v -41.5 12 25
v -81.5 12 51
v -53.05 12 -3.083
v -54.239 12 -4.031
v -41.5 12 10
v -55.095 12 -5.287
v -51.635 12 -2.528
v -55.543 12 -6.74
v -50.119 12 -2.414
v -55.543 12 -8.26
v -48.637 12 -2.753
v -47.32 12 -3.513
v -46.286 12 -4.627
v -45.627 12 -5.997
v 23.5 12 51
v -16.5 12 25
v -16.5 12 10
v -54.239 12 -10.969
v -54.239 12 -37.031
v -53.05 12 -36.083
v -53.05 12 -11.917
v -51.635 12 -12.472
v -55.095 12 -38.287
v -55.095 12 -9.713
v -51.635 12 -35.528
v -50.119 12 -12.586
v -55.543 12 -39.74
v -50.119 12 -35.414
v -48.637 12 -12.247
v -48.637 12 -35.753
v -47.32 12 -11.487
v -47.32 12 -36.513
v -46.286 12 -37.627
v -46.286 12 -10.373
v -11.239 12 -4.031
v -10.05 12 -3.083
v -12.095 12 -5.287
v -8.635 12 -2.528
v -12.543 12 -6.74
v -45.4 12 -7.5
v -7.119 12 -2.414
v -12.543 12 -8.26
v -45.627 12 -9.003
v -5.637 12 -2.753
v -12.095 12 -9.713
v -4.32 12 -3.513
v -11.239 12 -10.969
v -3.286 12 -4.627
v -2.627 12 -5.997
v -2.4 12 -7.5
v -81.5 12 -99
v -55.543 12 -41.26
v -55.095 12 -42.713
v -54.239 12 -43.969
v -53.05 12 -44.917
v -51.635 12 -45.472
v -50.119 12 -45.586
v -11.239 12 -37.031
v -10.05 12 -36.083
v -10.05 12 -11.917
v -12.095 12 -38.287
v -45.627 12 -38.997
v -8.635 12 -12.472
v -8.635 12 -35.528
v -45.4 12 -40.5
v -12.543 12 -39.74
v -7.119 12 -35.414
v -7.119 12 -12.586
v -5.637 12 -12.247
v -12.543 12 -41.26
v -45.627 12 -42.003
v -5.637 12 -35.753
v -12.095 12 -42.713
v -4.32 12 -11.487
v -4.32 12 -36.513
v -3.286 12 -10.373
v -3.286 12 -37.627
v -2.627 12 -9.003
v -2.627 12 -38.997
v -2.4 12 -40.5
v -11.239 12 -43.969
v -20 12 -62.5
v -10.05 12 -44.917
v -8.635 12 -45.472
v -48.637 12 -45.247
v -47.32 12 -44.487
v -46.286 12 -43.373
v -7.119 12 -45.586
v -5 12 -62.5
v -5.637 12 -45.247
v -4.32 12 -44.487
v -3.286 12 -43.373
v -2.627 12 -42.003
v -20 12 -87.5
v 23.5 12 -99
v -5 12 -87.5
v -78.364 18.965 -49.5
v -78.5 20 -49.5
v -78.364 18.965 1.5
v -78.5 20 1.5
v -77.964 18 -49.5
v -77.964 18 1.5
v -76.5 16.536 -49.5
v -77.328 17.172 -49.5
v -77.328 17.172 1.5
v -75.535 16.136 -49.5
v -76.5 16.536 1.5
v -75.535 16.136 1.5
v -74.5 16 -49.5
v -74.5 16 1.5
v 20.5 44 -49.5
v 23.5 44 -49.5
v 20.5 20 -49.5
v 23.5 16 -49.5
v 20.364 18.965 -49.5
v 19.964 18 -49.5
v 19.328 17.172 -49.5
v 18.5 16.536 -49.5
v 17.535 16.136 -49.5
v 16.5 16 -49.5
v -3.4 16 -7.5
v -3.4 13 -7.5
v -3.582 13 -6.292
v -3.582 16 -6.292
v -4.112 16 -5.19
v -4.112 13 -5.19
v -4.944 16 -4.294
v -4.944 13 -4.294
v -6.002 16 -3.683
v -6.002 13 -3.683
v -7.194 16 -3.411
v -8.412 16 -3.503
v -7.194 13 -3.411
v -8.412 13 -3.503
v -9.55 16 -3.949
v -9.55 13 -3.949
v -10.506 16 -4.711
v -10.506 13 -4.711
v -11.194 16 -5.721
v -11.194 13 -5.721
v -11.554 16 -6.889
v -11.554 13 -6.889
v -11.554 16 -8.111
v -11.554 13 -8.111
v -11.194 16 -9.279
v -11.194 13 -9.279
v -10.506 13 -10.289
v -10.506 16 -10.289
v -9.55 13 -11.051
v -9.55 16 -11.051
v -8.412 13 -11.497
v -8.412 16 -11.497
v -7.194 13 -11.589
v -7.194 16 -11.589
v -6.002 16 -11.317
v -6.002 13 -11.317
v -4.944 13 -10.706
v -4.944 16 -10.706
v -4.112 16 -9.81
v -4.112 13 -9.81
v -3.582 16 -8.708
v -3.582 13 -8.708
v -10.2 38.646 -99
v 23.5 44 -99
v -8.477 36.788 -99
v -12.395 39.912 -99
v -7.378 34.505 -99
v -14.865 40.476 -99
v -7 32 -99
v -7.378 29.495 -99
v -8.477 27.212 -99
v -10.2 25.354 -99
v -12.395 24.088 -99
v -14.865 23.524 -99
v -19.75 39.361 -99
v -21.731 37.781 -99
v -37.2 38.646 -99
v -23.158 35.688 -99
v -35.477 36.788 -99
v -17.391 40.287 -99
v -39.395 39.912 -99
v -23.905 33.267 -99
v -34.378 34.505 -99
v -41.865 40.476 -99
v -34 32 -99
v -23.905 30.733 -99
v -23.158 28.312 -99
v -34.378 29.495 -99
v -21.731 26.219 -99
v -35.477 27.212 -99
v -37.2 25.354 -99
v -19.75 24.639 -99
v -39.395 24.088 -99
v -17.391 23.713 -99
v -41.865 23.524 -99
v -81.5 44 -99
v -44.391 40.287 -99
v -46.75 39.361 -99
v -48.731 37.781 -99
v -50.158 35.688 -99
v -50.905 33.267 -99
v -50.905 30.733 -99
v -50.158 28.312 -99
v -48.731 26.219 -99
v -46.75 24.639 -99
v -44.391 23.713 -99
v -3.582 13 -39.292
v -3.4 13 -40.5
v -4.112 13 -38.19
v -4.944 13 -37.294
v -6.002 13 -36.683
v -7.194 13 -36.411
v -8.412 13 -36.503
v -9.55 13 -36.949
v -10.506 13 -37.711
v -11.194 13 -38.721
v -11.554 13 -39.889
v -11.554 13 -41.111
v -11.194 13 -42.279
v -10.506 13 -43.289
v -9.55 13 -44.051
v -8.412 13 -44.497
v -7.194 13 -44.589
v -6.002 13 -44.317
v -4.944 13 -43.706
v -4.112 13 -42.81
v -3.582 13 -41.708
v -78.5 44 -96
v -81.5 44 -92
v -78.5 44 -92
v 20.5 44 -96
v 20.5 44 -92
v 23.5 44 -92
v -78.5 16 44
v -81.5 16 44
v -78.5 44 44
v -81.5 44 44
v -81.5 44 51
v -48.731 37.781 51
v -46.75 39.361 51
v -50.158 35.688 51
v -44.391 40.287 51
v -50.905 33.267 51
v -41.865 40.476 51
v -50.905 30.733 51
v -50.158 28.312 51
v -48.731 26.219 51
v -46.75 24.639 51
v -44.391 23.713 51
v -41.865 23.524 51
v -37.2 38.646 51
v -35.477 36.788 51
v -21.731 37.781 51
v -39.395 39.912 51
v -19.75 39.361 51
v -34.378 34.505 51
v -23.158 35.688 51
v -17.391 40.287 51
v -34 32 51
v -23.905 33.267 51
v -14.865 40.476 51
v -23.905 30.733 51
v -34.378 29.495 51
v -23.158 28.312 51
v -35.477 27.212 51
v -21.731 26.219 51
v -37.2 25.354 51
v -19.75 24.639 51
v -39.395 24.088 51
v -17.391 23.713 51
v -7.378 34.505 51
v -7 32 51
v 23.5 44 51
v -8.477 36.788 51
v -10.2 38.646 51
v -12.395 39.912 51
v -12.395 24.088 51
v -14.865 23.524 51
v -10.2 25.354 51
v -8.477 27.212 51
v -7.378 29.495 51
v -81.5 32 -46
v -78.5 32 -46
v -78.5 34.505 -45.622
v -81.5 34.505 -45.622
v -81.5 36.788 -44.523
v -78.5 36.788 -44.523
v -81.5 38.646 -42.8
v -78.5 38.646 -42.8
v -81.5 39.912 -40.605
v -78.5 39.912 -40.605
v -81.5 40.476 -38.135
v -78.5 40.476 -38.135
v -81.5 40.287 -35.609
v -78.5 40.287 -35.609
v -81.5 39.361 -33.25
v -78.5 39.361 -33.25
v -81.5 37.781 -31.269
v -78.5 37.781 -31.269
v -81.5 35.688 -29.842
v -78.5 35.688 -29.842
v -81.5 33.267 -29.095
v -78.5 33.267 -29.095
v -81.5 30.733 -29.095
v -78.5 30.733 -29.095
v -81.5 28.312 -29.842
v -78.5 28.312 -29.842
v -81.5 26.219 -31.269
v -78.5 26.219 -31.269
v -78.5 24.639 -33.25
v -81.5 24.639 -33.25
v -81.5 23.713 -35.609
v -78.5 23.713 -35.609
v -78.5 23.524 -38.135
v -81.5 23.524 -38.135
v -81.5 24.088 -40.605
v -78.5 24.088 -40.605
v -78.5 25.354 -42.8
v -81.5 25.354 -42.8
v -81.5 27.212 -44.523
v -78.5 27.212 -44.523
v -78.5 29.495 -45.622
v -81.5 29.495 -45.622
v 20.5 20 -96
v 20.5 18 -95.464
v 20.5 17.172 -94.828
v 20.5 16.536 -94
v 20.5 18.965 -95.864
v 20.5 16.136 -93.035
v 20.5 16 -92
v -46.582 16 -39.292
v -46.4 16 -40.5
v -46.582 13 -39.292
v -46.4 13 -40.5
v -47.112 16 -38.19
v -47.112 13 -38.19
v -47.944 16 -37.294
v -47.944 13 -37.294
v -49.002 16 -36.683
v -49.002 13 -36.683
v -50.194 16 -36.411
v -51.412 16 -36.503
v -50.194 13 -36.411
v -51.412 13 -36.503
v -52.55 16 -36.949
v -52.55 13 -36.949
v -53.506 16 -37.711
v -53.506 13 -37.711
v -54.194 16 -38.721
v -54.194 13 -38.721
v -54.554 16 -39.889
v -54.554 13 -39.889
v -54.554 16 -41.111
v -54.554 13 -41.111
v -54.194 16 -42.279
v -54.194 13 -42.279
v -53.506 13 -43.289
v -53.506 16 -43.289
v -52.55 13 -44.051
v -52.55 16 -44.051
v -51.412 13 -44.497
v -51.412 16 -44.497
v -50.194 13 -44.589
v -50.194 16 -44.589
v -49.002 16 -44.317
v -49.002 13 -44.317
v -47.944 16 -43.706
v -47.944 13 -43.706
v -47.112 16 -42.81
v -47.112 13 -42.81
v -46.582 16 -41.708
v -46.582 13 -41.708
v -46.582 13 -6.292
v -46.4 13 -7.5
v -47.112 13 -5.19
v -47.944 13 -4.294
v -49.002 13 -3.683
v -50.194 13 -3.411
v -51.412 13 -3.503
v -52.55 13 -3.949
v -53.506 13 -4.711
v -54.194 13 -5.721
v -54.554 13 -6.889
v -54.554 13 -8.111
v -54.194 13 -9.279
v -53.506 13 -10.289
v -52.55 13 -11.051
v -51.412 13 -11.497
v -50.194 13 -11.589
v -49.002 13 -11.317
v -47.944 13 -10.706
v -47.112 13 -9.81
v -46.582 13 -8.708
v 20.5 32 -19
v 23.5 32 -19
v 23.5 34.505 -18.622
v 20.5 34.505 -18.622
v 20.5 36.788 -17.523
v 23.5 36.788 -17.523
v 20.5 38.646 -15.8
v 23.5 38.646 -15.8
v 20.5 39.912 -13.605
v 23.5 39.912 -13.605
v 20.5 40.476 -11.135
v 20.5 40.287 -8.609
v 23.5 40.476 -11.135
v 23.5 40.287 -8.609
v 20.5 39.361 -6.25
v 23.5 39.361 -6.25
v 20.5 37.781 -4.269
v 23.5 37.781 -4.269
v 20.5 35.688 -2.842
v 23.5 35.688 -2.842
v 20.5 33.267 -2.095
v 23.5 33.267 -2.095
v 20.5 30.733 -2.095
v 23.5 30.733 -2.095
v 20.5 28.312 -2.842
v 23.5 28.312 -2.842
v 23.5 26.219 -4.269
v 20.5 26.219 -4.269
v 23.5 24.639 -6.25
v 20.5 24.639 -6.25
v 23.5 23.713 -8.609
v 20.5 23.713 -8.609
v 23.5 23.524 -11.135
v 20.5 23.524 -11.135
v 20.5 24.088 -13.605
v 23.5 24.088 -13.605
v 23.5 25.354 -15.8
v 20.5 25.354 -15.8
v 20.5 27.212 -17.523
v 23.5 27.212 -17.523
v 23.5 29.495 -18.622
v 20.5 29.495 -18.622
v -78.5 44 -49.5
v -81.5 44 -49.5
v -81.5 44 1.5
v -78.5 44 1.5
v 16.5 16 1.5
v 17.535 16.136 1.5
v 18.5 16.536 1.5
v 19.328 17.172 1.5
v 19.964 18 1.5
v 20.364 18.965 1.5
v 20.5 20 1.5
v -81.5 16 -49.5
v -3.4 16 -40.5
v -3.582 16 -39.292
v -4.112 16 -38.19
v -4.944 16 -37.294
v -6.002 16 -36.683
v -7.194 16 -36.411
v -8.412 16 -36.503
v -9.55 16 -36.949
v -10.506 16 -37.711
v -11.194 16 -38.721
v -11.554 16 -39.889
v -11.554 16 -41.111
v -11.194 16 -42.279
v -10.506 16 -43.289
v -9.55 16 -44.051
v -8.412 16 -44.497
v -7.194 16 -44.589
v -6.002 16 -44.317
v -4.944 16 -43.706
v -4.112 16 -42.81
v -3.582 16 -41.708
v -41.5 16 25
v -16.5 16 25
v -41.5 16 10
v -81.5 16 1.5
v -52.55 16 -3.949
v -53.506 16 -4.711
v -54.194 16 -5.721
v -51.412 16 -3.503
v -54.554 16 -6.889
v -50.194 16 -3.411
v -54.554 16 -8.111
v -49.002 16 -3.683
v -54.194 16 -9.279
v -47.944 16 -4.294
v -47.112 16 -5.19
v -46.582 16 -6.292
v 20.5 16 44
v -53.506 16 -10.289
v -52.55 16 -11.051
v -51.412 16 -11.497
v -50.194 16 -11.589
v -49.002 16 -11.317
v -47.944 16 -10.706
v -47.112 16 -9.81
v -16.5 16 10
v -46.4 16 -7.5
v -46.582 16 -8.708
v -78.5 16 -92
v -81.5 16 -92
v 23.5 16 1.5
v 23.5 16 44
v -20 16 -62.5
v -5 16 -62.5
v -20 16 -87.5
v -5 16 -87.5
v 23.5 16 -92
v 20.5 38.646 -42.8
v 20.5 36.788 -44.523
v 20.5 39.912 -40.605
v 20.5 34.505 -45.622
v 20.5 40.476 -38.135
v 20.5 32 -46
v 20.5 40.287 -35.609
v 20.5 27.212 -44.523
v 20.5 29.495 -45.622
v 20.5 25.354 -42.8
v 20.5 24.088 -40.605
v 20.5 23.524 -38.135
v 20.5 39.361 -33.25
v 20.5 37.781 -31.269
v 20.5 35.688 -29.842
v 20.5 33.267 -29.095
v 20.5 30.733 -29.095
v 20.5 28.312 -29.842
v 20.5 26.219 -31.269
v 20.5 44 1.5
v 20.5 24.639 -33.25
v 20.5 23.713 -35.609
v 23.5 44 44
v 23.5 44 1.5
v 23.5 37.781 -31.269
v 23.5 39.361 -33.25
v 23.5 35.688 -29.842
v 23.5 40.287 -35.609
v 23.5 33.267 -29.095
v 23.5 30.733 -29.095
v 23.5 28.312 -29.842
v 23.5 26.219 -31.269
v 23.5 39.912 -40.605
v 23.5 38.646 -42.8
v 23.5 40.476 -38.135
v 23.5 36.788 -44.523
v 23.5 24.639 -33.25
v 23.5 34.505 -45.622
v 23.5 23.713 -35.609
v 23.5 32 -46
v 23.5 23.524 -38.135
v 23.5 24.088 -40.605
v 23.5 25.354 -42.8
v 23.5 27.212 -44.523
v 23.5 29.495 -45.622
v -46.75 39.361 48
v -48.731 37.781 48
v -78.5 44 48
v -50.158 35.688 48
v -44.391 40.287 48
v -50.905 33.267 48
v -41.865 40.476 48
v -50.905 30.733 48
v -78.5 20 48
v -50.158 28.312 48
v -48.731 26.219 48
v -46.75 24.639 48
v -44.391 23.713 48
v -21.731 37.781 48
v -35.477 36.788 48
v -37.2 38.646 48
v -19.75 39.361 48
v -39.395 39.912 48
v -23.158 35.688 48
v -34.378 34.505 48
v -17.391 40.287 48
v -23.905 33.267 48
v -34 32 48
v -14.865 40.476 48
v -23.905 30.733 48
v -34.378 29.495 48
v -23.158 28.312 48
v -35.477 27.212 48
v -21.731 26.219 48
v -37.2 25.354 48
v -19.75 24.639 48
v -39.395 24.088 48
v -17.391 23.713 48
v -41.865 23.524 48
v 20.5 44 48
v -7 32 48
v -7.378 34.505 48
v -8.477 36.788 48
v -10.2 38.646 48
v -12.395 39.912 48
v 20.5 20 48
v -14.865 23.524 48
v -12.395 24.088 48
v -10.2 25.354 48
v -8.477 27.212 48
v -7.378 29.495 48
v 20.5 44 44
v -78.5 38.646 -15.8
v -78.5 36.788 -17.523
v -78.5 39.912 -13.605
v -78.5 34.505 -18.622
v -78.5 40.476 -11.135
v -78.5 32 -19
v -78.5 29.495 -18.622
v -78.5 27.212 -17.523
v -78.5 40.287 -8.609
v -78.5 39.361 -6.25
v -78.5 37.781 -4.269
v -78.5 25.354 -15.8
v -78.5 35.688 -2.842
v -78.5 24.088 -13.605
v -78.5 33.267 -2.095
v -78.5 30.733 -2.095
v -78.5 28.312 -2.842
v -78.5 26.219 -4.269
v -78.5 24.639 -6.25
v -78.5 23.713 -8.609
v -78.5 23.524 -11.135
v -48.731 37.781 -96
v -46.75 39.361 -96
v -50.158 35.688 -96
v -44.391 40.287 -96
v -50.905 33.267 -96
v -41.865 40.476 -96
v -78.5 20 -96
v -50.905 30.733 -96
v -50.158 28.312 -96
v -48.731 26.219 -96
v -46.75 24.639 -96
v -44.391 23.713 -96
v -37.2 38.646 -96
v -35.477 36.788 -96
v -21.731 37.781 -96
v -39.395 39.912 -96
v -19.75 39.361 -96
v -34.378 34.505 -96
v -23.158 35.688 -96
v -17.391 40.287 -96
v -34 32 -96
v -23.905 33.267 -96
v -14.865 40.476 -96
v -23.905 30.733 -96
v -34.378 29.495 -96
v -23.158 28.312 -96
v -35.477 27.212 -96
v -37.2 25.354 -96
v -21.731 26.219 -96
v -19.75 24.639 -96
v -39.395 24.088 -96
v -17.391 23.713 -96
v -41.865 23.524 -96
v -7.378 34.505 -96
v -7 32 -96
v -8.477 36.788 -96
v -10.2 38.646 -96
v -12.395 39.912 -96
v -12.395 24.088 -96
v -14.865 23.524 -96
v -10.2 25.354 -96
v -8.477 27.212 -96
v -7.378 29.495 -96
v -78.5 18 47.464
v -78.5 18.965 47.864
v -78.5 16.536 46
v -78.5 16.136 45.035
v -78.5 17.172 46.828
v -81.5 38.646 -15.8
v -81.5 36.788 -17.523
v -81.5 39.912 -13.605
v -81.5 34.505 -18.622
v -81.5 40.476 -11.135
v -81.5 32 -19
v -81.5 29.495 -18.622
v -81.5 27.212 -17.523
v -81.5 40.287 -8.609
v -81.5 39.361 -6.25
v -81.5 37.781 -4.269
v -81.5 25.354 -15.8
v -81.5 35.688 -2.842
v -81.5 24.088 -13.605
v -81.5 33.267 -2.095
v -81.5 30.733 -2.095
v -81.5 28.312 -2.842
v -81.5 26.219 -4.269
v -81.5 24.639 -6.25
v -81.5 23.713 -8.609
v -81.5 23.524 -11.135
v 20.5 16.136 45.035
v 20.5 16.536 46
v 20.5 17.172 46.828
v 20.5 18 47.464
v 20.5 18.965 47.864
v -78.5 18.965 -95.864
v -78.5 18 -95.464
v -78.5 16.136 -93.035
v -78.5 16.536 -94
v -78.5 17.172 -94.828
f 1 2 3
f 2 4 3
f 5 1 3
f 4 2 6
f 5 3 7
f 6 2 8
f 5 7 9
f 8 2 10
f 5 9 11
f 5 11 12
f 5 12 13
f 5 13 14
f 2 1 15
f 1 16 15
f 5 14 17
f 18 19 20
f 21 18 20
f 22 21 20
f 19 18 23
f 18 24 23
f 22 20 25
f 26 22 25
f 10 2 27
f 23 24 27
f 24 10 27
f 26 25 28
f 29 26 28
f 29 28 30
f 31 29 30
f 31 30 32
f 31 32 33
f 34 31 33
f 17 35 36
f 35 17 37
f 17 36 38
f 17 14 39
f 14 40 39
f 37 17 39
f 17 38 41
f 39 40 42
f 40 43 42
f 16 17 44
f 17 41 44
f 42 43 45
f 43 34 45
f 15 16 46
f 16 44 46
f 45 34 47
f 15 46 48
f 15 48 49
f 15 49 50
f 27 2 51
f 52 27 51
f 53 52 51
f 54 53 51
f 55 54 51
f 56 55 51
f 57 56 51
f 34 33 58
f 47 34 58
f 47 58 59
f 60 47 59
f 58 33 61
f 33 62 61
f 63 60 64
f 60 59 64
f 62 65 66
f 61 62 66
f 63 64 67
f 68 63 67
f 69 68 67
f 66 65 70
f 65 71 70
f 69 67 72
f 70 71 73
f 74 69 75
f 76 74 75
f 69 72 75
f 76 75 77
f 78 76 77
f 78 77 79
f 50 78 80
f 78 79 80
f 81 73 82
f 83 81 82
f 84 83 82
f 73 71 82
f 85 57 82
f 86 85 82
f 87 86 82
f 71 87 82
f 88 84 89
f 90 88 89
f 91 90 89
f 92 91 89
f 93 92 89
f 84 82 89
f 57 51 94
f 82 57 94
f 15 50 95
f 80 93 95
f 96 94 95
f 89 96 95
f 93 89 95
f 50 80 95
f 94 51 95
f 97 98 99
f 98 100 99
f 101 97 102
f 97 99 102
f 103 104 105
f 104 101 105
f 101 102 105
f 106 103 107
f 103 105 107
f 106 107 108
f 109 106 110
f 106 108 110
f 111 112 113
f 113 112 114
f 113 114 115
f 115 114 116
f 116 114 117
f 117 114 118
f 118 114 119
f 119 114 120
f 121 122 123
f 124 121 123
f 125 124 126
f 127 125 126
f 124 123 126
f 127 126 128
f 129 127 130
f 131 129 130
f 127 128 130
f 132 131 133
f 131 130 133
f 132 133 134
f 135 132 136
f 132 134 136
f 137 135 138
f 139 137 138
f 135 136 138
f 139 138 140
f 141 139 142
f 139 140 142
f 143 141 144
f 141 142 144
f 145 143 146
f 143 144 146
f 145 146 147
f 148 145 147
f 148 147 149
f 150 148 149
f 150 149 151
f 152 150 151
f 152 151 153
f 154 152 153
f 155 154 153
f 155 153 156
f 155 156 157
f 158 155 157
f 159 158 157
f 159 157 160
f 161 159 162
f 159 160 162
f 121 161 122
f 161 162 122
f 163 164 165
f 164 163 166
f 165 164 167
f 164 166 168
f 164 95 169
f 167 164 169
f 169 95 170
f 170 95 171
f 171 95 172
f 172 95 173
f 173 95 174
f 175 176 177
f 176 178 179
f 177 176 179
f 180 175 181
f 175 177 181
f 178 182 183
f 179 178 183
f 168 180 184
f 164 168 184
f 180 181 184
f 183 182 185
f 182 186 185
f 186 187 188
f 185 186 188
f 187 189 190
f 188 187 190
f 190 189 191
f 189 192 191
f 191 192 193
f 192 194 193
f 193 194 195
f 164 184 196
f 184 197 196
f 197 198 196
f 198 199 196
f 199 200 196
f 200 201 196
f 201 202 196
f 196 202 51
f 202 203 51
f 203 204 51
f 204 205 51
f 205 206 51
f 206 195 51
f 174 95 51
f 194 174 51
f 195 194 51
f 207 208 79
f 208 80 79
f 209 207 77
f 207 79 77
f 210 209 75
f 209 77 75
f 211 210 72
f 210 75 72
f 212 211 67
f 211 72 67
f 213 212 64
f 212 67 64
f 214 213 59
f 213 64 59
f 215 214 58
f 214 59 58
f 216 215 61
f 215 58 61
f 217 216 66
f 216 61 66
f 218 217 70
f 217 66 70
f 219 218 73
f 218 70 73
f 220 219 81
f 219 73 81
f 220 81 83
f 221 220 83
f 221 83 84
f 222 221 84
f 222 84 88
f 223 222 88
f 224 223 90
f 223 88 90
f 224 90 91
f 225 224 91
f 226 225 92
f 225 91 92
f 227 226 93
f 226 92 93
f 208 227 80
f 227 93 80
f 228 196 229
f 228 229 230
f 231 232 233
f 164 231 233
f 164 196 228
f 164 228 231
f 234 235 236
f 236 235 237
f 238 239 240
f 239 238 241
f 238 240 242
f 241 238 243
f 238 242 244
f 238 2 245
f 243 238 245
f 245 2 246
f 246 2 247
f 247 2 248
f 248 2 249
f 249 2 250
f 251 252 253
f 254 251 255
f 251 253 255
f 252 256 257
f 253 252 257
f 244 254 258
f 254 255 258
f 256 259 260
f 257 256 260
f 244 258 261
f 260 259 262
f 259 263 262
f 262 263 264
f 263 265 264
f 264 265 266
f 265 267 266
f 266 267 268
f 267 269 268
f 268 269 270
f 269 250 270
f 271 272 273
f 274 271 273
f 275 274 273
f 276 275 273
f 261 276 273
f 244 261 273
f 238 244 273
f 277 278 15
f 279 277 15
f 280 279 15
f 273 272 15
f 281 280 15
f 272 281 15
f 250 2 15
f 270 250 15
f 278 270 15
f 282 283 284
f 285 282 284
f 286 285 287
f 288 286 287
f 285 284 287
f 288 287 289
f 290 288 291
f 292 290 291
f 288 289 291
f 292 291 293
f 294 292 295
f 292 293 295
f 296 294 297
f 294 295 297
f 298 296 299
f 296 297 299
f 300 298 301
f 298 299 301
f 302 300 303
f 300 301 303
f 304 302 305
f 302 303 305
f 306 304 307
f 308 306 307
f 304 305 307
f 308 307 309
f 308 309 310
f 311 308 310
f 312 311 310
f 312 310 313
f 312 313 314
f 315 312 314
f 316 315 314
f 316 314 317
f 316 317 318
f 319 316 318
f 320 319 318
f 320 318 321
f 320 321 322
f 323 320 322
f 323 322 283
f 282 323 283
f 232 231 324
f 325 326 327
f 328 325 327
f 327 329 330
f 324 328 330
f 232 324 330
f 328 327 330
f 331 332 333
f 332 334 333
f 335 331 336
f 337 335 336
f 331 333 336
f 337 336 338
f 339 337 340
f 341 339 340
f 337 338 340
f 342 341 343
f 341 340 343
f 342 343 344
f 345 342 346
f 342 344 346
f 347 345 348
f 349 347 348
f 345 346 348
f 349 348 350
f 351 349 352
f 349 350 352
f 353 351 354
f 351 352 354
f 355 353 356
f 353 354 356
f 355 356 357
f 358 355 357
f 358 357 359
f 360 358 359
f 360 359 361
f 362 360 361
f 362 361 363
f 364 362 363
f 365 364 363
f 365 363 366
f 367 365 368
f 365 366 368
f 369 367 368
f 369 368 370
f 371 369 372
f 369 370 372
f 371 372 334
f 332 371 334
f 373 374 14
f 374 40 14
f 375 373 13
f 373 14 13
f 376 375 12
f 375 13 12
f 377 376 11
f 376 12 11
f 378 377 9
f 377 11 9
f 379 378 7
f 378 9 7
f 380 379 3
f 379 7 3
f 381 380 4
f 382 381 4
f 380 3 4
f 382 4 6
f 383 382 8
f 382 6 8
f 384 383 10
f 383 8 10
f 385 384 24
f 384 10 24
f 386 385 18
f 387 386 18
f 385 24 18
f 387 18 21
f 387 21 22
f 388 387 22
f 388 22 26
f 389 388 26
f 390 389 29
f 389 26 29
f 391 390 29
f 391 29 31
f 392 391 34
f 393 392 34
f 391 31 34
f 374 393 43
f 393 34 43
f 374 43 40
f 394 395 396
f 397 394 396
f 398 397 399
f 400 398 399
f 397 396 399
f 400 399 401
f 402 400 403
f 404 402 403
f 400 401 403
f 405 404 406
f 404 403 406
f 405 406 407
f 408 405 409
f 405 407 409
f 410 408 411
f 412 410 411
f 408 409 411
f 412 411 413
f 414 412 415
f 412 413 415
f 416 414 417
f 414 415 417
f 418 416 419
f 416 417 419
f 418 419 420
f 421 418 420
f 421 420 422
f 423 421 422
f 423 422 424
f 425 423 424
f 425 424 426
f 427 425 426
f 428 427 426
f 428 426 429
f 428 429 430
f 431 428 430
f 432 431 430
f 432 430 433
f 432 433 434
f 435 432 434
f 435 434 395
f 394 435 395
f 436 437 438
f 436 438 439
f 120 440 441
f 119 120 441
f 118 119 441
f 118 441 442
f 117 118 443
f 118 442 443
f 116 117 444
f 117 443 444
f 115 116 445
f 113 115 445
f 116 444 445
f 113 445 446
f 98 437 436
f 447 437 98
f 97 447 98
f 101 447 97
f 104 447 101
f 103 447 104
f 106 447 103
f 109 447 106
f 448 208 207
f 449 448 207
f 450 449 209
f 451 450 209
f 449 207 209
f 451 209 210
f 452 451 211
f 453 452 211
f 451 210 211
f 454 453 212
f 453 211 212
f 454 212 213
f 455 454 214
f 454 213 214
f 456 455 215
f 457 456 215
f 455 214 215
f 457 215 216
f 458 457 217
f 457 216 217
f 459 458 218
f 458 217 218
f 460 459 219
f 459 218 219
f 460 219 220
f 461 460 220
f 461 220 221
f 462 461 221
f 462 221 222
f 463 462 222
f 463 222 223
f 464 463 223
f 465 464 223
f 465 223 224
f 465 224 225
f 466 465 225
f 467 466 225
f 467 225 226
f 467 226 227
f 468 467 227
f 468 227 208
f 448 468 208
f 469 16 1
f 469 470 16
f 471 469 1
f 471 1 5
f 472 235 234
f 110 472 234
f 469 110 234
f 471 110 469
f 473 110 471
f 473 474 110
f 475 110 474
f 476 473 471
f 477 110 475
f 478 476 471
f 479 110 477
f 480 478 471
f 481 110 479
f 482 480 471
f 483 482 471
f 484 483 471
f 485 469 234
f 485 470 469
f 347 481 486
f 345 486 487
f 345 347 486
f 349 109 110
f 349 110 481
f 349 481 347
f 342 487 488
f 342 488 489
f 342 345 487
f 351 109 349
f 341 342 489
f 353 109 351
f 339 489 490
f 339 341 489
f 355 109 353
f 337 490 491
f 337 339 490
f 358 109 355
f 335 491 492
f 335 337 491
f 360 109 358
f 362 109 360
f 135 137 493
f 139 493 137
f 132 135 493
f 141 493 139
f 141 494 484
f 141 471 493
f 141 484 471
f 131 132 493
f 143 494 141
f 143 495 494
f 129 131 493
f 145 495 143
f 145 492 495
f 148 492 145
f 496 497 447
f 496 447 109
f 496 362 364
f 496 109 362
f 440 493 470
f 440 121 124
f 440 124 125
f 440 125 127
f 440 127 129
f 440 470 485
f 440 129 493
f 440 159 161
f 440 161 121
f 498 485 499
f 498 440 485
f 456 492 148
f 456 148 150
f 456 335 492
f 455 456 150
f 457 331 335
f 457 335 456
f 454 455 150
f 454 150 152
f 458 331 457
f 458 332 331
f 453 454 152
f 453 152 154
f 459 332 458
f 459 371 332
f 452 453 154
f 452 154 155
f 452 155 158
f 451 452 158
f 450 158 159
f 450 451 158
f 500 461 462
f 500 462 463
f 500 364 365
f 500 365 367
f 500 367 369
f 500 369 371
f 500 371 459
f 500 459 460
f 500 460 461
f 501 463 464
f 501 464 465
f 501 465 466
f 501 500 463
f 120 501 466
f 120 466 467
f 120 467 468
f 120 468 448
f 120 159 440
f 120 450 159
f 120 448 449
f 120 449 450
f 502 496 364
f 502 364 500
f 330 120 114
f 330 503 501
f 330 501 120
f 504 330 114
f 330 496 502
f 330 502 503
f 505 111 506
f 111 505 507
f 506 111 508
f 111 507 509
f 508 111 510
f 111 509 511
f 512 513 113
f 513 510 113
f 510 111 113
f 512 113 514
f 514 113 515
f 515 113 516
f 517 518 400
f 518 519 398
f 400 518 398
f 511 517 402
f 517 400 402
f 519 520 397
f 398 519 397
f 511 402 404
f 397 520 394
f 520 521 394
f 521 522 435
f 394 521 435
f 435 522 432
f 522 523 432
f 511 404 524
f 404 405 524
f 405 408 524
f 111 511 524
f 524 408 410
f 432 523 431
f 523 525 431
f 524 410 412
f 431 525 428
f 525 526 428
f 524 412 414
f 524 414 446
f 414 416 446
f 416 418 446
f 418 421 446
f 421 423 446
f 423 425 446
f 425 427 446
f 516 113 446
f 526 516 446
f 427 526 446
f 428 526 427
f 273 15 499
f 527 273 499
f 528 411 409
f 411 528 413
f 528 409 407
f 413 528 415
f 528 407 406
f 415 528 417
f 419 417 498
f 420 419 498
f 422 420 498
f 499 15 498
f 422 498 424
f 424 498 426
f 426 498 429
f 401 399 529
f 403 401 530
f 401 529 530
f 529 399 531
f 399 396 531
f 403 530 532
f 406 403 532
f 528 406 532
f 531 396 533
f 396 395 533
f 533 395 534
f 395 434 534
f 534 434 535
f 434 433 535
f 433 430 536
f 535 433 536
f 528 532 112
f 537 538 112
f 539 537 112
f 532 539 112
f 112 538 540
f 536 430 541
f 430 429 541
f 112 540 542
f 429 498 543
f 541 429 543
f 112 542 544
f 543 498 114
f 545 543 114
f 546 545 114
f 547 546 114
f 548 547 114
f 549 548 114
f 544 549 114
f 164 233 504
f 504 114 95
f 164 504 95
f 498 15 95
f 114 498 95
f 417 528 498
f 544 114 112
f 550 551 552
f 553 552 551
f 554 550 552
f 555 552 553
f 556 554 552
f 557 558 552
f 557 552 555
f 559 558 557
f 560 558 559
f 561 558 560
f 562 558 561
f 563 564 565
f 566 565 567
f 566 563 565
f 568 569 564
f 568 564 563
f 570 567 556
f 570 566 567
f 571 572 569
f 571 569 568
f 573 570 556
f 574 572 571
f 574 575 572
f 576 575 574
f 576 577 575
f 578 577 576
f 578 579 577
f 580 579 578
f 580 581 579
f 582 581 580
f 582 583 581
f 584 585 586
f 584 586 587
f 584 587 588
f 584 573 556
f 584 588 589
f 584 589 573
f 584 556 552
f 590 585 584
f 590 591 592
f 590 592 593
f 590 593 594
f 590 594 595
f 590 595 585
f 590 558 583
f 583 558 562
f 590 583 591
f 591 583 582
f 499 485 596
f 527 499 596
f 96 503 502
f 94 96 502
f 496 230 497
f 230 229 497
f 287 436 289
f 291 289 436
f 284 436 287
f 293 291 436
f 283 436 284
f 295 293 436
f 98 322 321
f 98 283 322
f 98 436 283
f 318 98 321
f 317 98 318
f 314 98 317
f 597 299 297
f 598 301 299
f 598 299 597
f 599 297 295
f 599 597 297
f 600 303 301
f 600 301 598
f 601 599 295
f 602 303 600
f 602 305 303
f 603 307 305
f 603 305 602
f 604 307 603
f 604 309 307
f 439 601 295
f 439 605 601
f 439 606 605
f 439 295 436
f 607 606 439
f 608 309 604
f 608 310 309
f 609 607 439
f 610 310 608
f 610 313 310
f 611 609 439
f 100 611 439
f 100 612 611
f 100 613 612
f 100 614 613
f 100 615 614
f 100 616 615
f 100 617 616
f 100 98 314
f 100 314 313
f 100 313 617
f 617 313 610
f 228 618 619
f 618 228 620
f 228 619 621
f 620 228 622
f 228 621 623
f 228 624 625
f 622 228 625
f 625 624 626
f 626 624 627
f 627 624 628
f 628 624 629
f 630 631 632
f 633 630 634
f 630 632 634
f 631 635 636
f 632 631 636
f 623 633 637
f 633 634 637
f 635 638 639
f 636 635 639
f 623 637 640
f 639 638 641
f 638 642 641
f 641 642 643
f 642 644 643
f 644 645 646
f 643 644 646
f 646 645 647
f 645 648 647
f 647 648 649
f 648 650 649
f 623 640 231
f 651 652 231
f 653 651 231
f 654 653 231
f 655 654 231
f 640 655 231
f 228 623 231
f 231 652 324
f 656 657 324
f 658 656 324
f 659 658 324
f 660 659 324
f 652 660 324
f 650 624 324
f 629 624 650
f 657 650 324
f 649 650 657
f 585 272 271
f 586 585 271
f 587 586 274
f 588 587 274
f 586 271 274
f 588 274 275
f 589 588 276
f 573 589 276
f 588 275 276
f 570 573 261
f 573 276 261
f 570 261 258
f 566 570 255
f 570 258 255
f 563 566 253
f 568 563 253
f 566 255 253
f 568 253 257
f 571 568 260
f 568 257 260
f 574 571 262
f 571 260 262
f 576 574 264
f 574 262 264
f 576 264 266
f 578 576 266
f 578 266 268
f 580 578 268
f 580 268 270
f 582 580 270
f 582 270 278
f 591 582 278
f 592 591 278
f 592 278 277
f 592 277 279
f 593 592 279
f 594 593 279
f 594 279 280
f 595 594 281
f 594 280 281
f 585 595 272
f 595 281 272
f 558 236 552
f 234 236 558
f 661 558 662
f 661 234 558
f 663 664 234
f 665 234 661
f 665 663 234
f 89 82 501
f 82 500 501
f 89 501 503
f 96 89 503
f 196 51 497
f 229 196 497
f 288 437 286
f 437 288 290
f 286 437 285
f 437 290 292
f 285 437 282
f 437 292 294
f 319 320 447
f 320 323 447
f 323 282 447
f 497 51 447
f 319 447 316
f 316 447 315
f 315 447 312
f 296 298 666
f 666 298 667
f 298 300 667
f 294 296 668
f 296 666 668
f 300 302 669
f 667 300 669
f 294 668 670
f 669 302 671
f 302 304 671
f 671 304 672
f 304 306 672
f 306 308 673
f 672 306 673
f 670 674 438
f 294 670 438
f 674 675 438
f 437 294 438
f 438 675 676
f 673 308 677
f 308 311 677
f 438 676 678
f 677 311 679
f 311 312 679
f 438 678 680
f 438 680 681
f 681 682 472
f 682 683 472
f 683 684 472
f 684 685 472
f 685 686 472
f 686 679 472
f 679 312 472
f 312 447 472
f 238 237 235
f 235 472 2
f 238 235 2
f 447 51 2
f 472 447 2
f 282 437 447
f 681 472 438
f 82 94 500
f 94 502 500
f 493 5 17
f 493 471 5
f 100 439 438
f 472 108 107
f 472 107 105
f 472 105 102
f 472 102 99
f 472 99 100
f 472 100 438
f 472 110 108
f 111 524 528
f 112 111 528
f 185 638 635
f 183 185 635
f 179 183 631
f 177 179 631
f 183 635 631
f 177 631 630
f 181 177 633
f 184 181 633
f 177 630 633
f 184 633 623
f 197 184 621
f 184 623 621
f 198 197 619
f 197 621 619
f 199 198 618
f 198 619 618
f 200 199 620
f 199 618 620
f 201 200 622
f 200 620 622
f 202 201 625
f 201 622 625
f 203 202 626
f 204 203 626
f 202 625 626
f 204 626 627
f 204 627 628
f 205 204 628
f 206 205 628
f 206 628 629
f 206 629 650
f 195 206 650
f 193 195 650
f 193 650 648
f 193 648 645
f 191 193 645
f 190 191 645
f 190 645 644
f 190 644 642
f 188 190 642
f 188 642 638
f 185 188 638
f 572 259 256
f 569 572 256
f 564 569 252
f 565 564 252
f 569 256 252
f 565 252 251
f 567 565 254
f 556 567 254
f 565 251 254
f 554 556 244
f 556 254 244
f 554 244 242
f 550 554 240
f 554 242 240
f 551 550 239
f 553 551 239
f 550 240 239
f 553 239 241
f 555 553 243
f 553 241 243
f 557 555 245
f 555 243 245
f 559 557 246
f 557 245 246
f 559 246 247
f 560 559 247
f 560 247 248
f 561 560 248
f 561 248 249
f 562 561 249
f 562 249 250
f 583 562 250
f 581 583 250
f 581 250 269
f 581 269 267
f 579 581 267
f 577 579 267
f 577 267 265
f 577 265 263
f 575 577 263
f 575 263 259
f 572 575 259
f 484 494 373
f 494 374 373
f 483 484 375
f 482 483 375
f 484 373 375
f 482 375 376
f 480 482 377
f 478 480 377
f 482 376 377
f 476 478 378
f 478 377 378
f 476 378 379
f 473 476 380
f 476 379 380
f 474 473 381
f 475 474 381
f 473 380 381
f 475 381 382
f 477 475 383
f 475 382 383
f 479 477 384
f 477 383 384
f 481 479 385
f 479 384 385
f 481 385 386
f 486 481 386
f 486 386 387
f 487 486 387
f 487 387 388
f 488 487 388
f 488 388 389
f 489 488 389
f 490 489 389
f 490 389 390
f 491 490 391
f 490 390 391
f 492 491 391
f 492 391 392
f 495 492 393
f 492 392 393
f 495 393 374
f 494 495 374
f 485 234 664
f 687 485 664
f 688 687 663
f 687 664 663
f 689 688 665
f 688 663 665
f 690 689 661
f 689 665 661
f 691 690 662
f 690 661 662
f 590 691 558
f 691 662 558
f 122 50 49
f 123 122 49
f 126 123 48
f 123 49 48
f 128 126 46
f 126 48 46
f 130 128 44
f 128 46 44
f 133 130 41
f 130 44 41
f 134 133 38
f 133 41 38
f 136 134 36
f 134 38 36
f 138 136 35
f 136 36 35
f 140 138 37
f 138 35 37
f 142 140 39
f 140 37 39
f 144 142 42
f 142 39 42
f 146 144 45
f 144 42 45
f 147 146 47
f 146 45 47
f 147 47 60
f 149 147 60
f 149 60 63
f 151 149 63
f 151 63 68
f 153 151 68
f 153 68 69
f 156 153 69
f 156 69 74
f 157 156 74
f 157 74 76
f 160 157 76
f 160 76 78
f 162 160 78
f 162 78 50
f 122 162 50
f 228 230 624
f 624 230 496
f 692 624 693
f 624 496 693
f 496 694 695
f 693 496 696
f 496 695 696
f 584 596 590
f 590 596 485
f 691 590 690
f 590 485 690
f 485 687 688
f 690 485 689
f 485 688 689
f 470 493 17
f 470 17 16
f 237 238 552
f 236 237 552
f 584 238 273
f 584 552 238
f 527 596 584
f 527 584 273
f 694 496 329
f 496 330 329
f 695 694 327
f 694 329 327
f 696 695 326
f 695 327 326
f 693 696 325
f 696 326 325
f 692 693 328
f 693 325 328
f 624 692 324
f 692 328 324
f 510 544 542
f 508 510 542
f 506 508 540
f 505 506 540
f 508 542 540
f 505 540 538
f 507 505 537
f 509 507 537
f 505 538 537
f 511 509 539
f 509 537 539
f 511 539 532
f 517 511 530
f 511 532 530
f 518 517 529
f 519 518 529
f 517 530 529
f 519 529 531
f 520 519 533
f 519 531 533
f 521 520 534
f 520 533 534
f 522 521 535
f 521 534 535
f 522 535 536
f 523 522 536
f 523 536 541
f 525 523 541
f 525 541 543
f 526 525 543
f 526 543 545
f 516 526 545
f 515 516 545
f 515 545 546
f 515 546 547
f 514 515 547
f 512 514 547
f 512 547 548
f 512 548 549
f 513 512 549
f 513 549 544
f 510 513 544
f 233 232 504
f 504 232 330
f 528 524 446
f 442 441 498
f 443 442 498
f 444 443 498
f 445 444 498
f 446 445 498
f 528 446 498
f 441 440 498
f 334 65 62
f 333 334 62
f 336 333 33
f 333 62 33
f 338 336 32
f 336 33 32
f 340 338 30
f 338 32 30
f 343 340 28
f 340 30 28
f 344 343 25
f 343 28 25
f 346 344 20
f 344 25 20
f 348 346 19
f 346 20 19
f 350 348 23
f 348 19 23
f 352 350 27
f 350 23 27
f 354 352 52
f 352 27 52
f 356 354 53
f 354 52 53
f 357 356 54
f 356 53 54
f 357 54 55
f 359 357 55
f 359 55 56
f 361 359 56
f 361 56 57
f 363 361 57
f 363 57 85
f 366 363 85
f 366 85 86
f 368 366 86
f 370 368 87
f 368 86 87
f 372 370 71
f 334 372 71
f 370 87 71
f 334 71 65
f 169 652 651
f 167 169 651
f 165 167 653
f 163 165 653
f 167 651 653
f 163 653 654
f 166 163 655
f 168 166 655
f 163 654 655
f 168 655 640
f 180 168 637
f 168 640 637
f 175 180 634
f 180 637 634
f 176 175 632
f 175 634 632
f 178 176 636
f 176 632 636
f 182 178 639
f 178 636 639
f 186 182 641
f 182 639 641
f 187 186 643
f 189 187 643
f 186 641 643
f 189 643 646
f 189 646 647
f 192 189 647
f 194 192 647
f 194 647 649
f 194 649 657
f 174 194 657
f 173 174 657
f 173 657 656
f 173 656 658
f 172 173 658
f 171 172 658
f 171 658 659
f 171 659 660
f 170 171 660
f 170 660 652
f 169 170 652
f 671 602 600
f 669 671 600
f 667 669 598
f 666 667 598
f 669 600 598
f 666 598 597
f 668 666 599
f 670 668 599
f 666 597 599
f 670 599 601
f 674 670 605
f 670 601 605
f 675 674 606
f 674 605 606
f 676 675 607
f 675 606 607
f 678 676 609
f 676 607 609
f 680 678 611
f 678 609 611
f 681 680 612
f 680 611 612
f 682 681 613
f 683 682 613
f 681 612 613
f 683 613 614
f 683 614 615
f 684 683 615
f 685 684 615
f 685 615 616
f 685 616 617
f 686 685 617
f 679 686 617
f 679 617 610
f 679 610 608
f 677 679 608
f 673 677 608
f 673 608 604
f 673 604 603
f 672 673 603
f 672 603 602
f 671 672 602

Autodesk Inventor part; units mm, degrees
ref_plane "YZ Plane" through (0, 0, 0) normal (1, 0, 0) x (0, 1, 0)
ref_plane "XZ Plane" through (0, 0, 0) normal (0, 1, 0) x (-1, 0, 0)
ref_plane "XY Plane" through (0, 0, 0) normal (0, 0, 1) x (1, 0, 0)
sketch "Sketch1" plane through (0, 0, 0) normal (0, 1, 0) x (-1, 0, 0)
  line L0 (0, 0) -> (58, 0) construction
  line L1 (58, 0) -> (58, -48) construction
  line L2 (58, -48) -> (0, -48) construction
  line L3 (0, -48) -> (0, 0) construction
  circle A0 centre (50.5, -7.5) radius 2.35
  circle A1 centre (50.5, -40.5) radius 2.35
  circle A2 centre (7.5, -7.5) radius 2.35
  circle A3 centre (7.5, -40.5) radius 2.35
  circle A4 centre (50.5, -7.5) radius 5
  circle A5 centre (50.5, -40.5) radius 5
  circle A6 centre (7.5, -7.5) radius 5
  circle A7 centre (7.5, -40.5) radius 5
  dimension "d0" = 58
  dimension "d1" = 48
  dimension "d2" = 4.7
  dimension "d3" = 4.7
  dimension "d4" = 4.7
  dimension "d5" = 4.7
  dimension "d6" = 33
  dimension "d7" = 43
  dimension "d8" = 7.5
  dimension "d9" = 7.5
  dimension "d10" = 7.5
  dimension "d11" = 7.5
  dimension "d12" = 7.5
  dimension "d13" = 7.5
  dimension "d14" = 10
  dimension "d15" = 10
  dimension "d16" = 10
  dimension "d17" = 10
extrude "Extrusion1" add sketch "Sketch1" along normal blind 12
sketch "Sketch2" plane through (-50.5, 12, -7.5) normal (0, 1, 0) x (1, 0, 0)
  line L0 (-31, -58.5) -> (74, -58.5)
  line L1 (74, -58.5) -> (74, 91.5)
  line L2 (74, 91.5) -> (-31, 91.5)
  line L3 (-31, 91.5) -> (-31, -58.5)
  circle A0 centre (0, 0) radius 2.35 projected
  circle A1 centre (0, 33) radius 2.35 projected
  circle A2 centre (43, 33) radius 2.35 projected
  circle A3 centre (43, 0) radius 2.35 projected
  circle A4 centre (43, 0) radius 2.35
  point P0 (50.5, -7.5)
  dimension "d20" = 105
  dimension "d21" = 150
  dimension "d22" = 58.5
  dimension "d23" = 31
extrude "Extrusion3" add sketch "Sketch2" along normal blind 4
sketch "Sketch3" plane through (-50.5, 16, -7.5) normal (0, 1, 0) x (1, 0, 0)
  line L0 (-31, 91.5) -> (-31, -58.5) projected
  line L1 (-31, -58.5) -> (-31, -38.5)
  line L2 (-31, -38.5) -> (-28, -38.5)
  line L3 (-28, -38.5) -> (-28, -55.5)
  line L4 (-28, -55.5) -> (-11, -55.5)
  line L5 (-11, -58.5) -> (-31, -58.5)
  line L6 (-28, 88.5) -> (-11, 88.5)
  line L7 (74, -58.5) -> (74, 91.5) projected
  line L8 (74, 91.5) -> (54, 91.5)
  line L9 (71, 71.5) -> (74, 71.5)
  line L10 (74, 71.5) -> (74, 91.5)
  line L11 (74, -58.5) -> (74, -38.5)
  line L12 (74, -38.5) -> (71, -38.5)
  line L13 (71, -38.5) -> (71, -55.5)
  line L14 (71, -55.5) -> (54, -55.5)
  line L15 (54, -58.5) -> (74, -58.5)
  line L16 (74, 91.5) -> (-31, 91.5) projected
  line L17 (54, 88.5) -> (71, 88.5)
  line L18 (71, 88.5) -> (71, 71.5)
  line L19 (-11, 91.5) -> (-31, 91.5)
  line L20 (-31, 91.5) -> (-31, 71.5)
  line L21 (-31, 71.5) -> (-28, 71.5)
  line L22 (-28, 71.5) -> (-28, 88.5)
  line L23 (-11, -55.5) -> (54, -55.5)
  line L24 (54, -58.5) -> (-11, -58.5)
  line L25 (-11, 91.5) -> (54, 91.5)
  line L26 (54, 88.5) -> (-11, 88.5)
  point P0 (50.5, -7.5)
  dimension "d28" = 20
  dimension "d48" = 20
  dimension "d49" = 3
  dimension "d50" = 3
  dimension "d51" = 3
  dimension "d52" = 3
  dimension "d53" = 20
  dimension "d55" = 20
  dimension "d56" = 20
  dimension "d57" = 3
  dimension "d69" = 20
  dimension "d95" = 17
  dimension "d96" = 65
  dimension "d102" = 3
  dimension "d103" = 17
  dimension "d104" = 65
  dimension "d105" = 17
extrude "Extrusion4" add sketch "Sketch3" along normal blind 28 contours L16 L8 L7 L9 L18 L17 L26 L6 L22 L21 L0 | L2 L3 L4 L23 L14 L13 L12 L7 L15 L24 L5 L0
sketch "Sketch4" plane through (-81.5, 12, 51) normal (0, 0, 1) x (1, 0, 0)
  line L0 (0, 0) -> (0, 32) projected
  line L1 (0, 0) -> (100, 0)
  line L2 (100, 0) -> (100, -15)
  line L3 (100, -15) -> (0, -15)
  line L4 (0, -15) -> (0, 0)
  point P0 (81.5, -12)
  dimension "d59" = 100
  dimension "d60" = 15
extrude "remove legs" cut sketch "Sketch4" against normal through all
sketch "Sketch5" plane through (-50.5, 12, -7.5) normal (0, -1, 0) x (1, 0, 0)
  circle A0 centre (0, 0) radius 2.35 projected
  circle A1 centre (0, 0) radius 4.1
  circle A2 centre (43, 0) radius 2.35 projected
  circle A3 centre (43, 0) radius 4.1
  circle A4 centre (43, -33) radius 2.35 projected
  circle A5 centre (43, -33) radius 4.1
  circle A6 centre (0, -33) radius 2.35 projected
  circle A7 centre (0, -33) radius 4.1
  circle A8 centre (0, 0) radius 2.35
  circle A9 centre (43, 0) radius 2.35
  circle A10 centre (43, -33) radius 2.35
  circle A11 centre (0, -33) radius 2.35
  point P0 (50.5, 7.5)
  dimension "d63" = 8.2
  dimension "d64" = 8.2
  dimension "d65" = 8.2
  dimension "d66" = 8.2
extrude "Extrusion6" cut sketch "Sketch5" against normal blind 4
sketch "Sketch6" plane through (-50.5, 16, -7.5) normal (0, 1, 0) x (1, 0, 0)
  line L0 (9, -17.5) -> (34, -17.5)
  line L1 (34, -17.5) -> (34, -32.5)
  line L2 (34, -32.5) -> (9, -32.5)
  line L3 (9, -32.5) -> (9, -17.5)
  line L4 (30.5, 55) -> (45.5, 55)
  line L5 (45.5, 55) -> (45.5, 80)
  line L6 (45.5, 80) -> (30.5, 80)
  line L7 (30.5, 80) -> (30.5, 55)
  circle A0 centre (43, 33) radius 4.1 construction
  circle A1 centre (0, 33) radius 4.1 construction
  circle A2 centre (0, 0) radius 4.1 construction
  circle A3 centre (43, 0) radius 4.1 construction
  point P0 (50.5, -7.5)
  dimension "d72" = 25
  dimension "d73" = 15
  dimension "d74" = 15
  dimension "d75" = 25
  dimension "d76" = 22
  dimension "d77" = 2.5
  dimension "d78" = 9
  dimension "d79" = 17.5
extrude "Extrusion7" cut sketch "Sketch6" against normal blind 10
chamfer "Chamfer1" distance 1 angle 45 4 edges at (-11.6, 12, -7.5) (-11.6, 12, -40.5) (-54.6, 12, -40.5) (-54.6, 12, -7.5)
sketch "Sketch7" plane through (-50.5, 16, -7.5) normal (0, 1, 0) x (1, 0, 0)
  line L0 (74, -38.5) -> (74, 71.5) projected
  line L1 (74, 42) -> (71, 42)
  line L2 (71, 42) -> (71, -9)
  line L3 (71, -9) -> (74, -9)
  line L4 (74, -9) -> (74, 42)
  line L5 (-31, 71.5) -> (-31, -38.5) projected
  line L6 (-31, 42) -> (-28, 42)
  line L7 (-28, 42) -> (-28, -9)
  line L8 (-28, -9) -> (-31, -9)
  line L9 (-31, -9) -> (-31, 42)
  line L10 (-31, -58.5) -> (74, -58.5) projected
  point P0 (50.5, -7.5)
  point P1 (74, -28.5)
  point P2 (74, 61.5)
  point P3 (-31, 67.5)
  point P4 (-31, -28.5)
  point P5 (72.5, 42)
  point P6 (-29.5, 42)
  point P7 (-31, -9)
  point P8 (74, -48.5)
  point P9 (-31, -48.5)
  dimension "d88" = 3
  dimension "d89" = 51
  dimension "d91" = 3
  dimension "d92" = 51
  dimension "d116" = 49.5
sketch "Sketch8" plane through (23.5, 12, 51) normal (1, 0, 0) x (0, 0, -1)
  circle A0 centre (61.5, 20) radius 8.5
  circle A1 centre (88.5, 20) radius 8.5
  line L0 (0, 0) -> (150, 0) projected
  line L1 (0, 0) -> (0, 32) projected
  point P0 (51, -12)
  dimension "d106" = 17
  dimension "d107" = 17
  dimension "d108" = 27
  dimension "d109" = 20
  dimension "d119" = 61.5
sketch "Sketch9" plane through (-81.5, 12, 51) normal (0, 0, 1) x (1, 0, 0)
  circle A0 centre (39, 20) radius 8.5
  circle A1 centre (66, 20) radius 8.5
  line L0 (0, 0) -> (105, 0) projected
  line L1 (0, 0) -> (0, 32) projected
  point P0 (81.5, -12)
  dimension "d113" = 17
  dimension "d114" = 17
  dimension "d115" = 20
  dimension "d124" = 20
  dimension "d125" = 39
  dimension "d126" = 27
extrude "Extrusion10" add sketch "Sketch7" along normal blind 28
extrude "Extrusion11" cut sketch "Sketch8" against normal through all
extrude "Extrusion12" cut sketch "Sketch9" against normal through all
sketch "Sketch11" plane through (-81.5, 12, -99) normal (-1, 0, 0) x (0, 0, 1)
  line L0 (20, 32) -> (3, 32) projected
  line L1 (3, 4) -> (20, 4) projected
  line L2 (20, 32) -> (7, 32)
  line L3 (7, 32) -> (7, 4)
  line L4 (7, 4) -> (20, 4)
  line L5 (20, 4) -> (20, 32)
  point P0 (99, -12)
  point P1 (20, 4)
  point P2 (7, 32)
  dimension "d127" = 13
extrude "Extrusion13" cut sketch "Sketch11" against normal through all
fillet "Fillet3" radius 4 2 edges at (20.5, 16, -24) (-78.5, 16, -24)
fillet "Fillet4" radius 4 2 edges at (-29, 16, -96) (-29, 16, 48)
sketch "Sketch12" plane through (-81.5, 12, -99) normal (-1, 0, 0) x (0, 0, 1)
  line L0 (100.5, 4) -> (130, 4) projected
  line L1 (130, 32) -> (150, 32) projected
  line L2 (130, 4) -> (143, 4)
  line L3 (143, 4) -> (143, 32)
  line L4 (143, 32) -> (130, 32)
  line L5 (130, 32) -> (130, 4)
  point P0 (99, -12)
  point P1 (130, 18)
  dimension "d132" = 13
extrude "Extrusion14" cut sketch "Sketch12" against normal through all
properties part number "TestingPlatform_base01"
